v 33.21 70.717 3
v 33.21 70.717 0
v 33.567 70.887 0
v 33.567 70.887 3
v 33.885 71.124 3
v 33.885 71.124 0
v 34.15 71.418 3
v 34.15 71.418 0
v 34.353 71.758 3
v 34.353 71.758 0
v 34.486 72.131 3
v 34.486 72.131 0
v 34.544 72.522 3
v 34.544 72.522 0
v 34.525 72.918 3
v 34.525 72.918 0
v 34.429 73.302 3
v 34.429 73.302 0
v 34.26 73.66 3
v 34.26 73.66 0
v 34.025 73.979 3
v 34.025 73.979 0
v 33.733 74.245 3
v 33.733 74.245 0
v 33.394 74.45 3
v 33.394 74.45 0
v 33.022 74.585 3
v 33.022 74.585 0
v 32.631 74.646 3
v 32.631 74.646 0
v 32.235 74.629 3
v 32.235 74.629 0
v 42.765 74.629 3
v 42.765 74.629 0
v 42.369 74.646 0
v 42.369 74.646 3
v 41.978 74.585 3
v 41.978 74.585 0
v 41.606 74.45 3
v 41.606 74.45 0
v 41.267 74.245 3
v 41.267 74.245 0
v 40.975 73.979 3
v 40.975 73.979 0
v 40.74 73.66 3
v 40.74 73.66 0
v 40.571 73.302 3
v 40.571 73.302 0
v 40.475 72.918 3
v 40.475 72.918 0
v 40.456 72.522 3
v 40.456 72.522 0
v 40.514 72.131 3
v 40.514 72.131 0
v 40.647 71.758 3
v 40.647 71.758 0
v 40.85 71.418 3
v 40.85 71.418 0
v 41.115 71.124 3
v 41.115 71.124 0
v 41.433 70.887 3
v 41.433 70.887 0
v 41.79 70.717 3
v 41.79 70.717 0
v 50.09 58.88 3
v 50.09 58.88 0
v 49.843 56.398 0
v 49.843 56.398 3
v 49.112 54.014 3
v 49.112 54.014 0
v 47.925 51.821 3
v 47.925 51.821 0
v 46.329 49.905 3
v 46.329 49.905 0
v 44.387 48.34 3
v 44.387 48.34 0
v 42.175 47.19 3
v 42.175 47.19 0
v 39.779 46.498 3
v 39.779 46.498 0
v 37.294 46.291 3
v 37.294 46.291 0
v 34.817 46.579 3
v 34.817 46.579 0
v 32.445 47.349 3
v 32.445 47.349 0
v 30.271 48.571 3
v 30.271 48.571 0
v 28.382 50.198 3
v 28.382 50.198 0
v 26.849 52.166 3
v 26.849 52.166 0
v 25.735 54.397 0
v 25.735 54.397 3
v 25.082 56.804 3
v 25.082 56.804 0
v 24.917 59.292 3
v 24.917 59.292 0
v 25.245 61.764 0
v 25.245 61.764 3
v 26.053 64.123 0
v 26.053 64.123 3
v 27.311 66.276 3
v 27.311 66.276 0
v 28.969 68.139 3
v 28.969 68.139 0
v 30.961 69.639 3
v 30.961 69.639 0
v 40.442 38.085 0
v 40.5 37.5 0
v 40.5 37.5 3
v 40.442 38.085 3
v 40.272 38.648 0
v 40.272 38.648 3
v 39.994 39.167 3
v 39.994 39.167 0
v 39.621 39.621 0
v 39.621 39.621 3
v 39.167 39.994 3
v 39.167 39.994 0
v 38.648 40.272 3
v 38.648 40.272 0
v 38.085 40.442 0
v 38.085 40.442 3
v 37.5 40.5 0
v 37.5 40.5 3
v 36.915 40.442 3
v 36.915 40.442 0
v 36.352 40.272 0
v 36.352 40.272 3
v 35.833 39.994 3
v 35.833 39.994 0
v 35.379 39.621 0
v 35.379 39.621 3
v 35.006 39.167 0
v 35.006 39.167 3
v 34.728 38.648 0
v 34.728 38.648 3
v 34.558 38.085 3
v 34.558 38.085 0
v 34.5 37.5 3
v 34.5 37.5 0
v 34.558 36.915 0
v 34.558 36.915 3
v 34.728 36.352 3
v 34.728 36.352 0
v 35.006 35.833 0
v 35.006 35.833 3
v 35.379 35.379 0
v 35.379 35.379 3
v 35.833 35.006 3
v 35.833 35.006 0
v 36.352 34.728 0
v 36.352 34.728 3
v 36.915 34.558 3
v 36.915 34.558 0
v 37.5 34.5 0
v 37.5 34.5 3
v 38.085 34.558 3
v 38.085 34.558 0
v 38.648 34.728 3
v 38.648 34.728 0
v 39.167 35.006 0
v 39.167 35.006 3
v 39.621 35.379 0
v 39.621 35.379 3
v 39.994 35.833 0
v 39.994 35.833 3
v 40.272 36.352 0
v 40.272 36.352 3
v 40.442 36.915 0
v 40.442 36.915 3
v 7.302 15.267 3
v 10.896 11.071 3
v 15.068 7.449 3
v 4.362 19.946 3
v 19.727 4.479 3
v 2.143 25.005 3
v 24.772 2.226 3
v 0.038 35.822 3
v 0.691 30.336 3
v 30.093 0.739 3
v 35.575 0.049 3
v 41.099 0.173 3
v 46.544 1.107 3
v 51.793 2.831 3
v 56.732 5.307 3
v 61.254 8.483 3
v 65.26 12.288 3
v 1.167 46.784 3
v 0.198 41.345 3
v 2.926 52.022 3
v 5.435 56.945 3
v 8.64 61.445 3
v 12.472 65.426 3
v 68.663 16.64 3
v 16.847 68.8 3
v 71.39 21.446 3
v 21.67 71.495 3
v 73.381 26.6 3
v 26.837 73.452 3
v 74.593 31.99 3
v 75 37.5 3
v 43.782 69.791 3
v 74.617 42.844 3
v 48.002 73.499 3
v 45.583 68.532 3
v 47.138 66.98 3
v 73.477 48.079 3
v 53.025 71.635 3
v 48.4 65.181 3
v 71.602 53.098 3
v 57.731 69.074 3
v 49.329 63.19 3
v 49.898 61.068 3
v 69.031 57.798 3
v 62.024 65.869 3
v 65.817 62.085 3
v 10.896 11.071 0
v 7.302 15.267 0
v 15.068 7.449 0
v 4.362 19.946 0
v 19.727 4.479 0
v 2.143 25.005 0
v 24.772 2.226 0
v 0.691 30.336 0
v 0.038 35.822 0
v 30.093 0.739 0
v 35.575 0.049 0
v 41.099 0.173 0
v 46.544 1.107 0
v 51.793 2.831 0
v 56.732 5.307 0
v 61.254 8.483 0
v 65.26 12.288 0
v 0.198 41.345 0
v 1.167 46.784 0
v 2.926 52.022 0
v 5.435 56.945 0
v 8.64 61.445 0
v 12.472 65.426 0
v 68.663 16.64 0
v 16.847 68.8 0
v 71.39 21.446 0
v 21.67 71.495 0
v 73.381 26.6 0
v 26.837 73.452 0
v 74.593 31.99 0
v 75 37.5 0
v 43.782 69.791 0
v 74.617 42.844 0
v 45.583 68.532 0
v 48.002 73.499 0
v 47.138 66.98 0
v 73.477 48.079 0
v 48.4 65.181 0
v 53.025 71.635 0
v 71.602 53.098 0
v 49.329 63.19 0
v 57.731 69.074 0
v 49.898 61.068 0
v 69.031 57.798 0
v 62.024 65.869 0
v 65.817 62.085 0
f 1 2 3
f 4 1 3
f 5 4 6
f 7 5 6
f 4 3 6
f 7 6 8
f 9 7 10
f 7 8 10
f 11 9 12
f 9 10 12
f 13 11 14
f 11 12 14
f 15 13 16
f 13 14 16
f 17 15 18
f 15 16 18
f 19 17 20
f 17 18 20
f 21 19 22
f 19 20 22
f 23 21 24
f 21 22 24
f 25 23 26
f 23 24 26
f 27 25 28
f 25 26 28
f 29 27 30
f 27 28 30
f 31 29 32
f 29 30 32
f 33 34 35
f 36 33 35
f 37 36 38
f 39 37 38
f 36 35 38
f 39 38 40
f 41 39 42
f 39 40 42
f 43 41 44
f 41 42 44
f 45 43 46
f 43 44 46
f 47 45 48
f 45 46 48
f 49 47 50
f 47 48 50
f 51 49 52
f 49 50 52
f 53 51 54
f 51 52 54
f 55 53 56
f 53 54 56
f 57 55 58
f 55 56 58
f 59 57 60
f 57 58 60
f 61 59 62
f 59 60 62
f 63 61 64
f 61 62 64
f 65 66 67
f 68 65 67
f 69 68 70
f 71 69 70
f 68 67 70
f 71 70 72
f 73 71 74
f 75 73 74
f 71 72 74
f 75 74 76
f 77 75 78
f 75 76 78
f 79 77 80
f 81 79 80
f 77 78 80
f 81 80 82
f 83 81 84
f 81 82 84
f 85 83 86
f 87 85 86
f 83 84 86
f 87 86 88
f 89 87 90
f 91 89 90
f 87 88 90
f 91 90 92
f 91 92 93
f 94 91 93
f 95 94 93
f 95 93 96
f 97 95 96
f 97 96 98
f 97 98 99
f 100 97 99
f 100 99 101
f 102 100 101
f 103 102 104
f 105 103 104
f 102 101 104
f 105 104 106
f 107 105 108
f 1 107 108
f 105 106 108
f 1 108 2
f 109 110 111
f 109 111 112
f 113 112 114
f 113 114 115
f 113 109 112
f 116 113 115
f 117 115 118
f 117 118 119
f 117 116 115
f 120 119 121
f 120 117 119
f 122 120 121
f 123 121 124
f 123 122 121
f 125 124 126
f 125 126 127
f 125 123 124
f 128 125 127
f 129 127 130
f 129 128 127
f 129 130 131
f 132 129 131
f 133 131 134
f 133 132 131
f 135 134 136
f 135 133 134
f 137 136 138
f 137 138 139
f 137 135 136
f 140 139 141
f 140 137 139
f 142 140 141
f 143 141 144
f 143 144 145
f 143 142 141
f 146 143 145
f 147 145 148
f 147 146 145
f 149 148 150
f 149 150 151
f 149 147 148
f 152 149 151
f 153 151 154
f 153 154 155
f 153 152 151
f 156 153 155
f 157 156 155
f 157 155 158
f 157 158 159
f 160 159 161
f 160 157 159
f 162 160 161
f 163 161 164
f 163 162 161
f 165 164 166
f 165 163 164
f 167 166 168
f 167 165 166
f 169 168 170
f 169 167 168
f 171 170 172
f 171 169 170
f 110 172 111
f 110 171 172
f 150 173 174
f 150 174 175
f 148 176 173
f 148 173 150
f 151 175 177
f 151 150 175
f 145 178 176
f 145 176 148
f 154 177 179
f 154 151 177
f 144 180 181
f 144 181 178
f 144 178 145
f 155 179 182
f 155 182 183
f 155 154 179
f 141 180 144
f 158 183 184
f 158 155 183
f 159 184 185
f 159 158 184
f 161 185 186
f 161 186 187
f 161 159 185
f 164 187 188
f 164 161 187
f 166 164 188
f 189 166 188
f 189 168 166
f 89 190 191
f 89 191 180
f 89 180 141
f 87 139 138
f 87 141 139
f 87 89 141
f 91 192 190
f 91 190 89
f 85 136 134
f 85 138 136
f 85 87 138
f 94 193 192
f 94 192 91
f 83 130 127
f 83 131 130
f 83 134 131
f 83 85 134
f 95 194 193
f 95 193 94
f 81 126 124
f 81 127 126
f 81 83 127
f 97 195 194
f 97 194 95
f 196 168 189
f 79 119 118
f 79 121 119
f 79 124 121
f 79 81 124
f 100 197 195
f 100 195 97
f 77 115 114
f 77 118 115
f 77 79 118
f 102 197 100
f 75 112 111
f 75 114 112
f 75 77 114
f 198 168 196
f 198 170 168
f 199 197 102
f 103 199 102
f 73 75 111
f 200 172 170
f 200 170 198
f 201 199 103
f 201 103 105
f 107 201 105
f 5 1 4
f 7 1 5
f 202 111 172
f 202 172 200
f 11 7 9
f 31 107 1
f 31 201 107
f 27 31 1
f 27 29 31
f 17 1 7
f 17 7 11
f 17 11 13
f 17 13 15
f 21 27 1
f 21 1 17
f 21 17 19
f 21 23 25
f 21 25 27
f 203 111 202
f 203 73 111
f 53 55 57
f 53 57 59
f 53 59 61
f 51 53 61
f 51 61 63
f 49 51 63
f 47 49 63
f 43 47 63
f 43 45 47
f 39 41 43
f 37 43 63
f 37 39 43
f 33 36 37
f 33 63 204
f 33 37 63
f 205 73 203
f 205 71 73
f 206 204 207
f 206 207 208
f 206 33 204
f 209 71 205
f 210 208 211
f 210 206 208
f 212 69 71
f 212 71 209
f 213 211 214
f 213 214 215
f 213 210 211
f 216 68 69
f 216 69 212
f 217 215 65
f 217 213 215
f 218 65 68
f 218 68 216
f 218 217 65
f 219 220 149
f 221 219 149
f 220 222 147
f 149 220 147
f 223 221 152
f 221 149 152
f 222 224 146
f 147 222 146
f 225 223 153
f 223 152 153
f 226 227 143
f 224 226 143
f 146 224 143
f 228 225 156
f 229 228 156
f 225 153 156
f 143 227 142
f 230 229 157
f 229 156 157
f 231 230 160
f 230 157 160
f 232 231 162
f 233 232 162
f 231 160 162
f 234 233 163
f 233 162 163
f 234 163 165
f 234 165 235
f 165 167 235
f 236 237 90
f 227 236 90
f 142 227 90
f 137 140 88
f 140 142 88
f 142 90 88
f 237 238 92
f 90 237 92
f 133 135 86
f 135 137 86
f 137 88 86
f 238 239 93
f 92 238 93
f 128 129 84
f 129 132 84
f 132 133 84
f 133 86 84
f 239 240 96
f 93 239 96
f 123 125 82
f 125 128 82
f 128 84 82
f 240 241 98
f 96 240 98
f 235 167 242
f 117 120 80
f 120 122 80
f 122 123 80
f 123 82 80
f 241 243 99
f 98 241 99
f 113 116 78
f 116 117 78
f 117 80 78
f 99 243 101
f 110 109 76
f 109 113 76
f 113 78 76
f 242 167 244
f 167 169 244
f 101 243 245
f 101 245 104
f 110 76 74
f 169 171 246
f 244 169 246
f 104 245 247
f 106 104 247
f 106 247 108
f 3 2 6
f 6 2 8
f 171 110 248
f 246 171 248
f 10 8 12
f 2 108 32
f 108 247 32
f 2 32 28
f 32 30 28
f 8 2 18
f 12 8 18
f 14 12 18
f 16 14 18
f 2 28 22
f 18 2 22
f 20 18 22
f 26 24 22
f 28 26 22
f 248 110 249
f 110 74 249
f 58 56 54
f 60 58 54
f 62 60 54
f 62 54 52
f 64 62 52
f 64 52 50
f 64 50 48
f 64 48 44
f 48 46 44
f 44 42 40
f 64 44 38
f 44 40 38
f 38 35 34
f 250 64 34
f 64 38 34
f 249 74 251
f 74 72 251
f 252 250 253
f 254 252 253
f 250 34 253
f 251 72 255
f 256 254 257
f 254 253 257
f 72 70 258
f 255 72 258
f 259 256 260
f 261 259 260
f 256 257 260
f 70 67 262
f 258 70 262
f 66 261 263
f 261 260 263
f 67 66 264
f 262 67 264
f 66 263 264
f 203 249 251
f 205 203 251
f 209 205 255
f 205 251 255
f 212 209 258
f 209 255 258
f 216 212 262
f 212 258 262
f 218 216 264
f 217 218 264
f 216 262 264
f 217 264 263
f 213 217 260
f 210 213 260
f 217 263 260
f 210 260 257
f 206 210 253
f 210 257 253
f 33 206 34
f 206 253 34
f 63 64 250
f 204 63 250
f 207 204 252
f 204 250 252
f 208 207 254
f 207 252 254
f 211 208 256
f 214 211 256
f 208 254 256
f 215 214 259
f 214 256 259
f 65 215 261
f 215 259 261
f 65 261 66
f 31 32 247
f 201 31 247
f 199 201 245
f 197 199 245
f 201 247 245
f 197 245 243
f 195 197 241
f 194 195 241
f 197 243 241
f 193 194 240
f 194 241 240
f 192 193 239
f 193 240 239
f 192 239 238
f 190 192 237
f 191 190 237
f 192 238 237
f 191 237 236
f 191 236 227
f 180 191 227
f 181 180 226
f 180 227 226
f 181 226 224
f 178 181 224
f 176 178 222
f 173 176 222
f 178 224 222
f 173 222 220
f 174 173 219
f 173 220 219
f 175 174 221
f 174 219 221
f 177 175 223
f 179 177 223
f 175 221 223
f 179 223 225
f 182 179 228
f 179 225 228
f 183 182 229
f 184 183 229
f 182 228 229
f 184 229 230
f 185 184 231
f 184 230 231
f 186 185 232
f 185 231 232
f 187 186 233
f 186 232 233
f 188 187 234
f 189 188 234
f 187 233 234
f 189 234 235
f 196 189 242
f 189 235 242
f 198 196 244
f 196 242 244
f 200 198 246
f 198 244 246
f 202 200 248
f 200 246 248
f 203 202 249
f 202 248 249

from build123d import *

# Parameters (mm, degrees)
F0_R     = 3
F1_DEPTH = 3


with BuildPart() as f1:
    # F0 (on Top) → F1 (new body)
    with BuildSketch(Plane.XY):
        with BuildLine():
            ThreePointArc((32.235098, 74.628571), (12.915287, 9.183187), (75, 37.5))
            ThreePointArc((75, 37.5), (65.816813, 62.084713), (42.764902, 74.628571))
            ThreePointArc((42.764902, 74.628571), (40.513824, 73.11211), (41.789806, 70.716514))
            ThreePointArc((41.789806, 70.716514), (47.808281, 66.108235), (50.090155, 58.879726))
            ThreePointArc((50.090155, 58.879726), (30.271491, 48.571444), (33.210194, 70.716514))
            ThreePointArc((33.210194, 70.716514), (34.486176, 73.11211), (32.235098, 74.628571))
        make_face()
        with Locations((37.5, 37.5)):
            Circle(F0_R, mode=Mode.SUBTRACT)
    extrude(amount=F1_DEPTH)


solid = f1.part
